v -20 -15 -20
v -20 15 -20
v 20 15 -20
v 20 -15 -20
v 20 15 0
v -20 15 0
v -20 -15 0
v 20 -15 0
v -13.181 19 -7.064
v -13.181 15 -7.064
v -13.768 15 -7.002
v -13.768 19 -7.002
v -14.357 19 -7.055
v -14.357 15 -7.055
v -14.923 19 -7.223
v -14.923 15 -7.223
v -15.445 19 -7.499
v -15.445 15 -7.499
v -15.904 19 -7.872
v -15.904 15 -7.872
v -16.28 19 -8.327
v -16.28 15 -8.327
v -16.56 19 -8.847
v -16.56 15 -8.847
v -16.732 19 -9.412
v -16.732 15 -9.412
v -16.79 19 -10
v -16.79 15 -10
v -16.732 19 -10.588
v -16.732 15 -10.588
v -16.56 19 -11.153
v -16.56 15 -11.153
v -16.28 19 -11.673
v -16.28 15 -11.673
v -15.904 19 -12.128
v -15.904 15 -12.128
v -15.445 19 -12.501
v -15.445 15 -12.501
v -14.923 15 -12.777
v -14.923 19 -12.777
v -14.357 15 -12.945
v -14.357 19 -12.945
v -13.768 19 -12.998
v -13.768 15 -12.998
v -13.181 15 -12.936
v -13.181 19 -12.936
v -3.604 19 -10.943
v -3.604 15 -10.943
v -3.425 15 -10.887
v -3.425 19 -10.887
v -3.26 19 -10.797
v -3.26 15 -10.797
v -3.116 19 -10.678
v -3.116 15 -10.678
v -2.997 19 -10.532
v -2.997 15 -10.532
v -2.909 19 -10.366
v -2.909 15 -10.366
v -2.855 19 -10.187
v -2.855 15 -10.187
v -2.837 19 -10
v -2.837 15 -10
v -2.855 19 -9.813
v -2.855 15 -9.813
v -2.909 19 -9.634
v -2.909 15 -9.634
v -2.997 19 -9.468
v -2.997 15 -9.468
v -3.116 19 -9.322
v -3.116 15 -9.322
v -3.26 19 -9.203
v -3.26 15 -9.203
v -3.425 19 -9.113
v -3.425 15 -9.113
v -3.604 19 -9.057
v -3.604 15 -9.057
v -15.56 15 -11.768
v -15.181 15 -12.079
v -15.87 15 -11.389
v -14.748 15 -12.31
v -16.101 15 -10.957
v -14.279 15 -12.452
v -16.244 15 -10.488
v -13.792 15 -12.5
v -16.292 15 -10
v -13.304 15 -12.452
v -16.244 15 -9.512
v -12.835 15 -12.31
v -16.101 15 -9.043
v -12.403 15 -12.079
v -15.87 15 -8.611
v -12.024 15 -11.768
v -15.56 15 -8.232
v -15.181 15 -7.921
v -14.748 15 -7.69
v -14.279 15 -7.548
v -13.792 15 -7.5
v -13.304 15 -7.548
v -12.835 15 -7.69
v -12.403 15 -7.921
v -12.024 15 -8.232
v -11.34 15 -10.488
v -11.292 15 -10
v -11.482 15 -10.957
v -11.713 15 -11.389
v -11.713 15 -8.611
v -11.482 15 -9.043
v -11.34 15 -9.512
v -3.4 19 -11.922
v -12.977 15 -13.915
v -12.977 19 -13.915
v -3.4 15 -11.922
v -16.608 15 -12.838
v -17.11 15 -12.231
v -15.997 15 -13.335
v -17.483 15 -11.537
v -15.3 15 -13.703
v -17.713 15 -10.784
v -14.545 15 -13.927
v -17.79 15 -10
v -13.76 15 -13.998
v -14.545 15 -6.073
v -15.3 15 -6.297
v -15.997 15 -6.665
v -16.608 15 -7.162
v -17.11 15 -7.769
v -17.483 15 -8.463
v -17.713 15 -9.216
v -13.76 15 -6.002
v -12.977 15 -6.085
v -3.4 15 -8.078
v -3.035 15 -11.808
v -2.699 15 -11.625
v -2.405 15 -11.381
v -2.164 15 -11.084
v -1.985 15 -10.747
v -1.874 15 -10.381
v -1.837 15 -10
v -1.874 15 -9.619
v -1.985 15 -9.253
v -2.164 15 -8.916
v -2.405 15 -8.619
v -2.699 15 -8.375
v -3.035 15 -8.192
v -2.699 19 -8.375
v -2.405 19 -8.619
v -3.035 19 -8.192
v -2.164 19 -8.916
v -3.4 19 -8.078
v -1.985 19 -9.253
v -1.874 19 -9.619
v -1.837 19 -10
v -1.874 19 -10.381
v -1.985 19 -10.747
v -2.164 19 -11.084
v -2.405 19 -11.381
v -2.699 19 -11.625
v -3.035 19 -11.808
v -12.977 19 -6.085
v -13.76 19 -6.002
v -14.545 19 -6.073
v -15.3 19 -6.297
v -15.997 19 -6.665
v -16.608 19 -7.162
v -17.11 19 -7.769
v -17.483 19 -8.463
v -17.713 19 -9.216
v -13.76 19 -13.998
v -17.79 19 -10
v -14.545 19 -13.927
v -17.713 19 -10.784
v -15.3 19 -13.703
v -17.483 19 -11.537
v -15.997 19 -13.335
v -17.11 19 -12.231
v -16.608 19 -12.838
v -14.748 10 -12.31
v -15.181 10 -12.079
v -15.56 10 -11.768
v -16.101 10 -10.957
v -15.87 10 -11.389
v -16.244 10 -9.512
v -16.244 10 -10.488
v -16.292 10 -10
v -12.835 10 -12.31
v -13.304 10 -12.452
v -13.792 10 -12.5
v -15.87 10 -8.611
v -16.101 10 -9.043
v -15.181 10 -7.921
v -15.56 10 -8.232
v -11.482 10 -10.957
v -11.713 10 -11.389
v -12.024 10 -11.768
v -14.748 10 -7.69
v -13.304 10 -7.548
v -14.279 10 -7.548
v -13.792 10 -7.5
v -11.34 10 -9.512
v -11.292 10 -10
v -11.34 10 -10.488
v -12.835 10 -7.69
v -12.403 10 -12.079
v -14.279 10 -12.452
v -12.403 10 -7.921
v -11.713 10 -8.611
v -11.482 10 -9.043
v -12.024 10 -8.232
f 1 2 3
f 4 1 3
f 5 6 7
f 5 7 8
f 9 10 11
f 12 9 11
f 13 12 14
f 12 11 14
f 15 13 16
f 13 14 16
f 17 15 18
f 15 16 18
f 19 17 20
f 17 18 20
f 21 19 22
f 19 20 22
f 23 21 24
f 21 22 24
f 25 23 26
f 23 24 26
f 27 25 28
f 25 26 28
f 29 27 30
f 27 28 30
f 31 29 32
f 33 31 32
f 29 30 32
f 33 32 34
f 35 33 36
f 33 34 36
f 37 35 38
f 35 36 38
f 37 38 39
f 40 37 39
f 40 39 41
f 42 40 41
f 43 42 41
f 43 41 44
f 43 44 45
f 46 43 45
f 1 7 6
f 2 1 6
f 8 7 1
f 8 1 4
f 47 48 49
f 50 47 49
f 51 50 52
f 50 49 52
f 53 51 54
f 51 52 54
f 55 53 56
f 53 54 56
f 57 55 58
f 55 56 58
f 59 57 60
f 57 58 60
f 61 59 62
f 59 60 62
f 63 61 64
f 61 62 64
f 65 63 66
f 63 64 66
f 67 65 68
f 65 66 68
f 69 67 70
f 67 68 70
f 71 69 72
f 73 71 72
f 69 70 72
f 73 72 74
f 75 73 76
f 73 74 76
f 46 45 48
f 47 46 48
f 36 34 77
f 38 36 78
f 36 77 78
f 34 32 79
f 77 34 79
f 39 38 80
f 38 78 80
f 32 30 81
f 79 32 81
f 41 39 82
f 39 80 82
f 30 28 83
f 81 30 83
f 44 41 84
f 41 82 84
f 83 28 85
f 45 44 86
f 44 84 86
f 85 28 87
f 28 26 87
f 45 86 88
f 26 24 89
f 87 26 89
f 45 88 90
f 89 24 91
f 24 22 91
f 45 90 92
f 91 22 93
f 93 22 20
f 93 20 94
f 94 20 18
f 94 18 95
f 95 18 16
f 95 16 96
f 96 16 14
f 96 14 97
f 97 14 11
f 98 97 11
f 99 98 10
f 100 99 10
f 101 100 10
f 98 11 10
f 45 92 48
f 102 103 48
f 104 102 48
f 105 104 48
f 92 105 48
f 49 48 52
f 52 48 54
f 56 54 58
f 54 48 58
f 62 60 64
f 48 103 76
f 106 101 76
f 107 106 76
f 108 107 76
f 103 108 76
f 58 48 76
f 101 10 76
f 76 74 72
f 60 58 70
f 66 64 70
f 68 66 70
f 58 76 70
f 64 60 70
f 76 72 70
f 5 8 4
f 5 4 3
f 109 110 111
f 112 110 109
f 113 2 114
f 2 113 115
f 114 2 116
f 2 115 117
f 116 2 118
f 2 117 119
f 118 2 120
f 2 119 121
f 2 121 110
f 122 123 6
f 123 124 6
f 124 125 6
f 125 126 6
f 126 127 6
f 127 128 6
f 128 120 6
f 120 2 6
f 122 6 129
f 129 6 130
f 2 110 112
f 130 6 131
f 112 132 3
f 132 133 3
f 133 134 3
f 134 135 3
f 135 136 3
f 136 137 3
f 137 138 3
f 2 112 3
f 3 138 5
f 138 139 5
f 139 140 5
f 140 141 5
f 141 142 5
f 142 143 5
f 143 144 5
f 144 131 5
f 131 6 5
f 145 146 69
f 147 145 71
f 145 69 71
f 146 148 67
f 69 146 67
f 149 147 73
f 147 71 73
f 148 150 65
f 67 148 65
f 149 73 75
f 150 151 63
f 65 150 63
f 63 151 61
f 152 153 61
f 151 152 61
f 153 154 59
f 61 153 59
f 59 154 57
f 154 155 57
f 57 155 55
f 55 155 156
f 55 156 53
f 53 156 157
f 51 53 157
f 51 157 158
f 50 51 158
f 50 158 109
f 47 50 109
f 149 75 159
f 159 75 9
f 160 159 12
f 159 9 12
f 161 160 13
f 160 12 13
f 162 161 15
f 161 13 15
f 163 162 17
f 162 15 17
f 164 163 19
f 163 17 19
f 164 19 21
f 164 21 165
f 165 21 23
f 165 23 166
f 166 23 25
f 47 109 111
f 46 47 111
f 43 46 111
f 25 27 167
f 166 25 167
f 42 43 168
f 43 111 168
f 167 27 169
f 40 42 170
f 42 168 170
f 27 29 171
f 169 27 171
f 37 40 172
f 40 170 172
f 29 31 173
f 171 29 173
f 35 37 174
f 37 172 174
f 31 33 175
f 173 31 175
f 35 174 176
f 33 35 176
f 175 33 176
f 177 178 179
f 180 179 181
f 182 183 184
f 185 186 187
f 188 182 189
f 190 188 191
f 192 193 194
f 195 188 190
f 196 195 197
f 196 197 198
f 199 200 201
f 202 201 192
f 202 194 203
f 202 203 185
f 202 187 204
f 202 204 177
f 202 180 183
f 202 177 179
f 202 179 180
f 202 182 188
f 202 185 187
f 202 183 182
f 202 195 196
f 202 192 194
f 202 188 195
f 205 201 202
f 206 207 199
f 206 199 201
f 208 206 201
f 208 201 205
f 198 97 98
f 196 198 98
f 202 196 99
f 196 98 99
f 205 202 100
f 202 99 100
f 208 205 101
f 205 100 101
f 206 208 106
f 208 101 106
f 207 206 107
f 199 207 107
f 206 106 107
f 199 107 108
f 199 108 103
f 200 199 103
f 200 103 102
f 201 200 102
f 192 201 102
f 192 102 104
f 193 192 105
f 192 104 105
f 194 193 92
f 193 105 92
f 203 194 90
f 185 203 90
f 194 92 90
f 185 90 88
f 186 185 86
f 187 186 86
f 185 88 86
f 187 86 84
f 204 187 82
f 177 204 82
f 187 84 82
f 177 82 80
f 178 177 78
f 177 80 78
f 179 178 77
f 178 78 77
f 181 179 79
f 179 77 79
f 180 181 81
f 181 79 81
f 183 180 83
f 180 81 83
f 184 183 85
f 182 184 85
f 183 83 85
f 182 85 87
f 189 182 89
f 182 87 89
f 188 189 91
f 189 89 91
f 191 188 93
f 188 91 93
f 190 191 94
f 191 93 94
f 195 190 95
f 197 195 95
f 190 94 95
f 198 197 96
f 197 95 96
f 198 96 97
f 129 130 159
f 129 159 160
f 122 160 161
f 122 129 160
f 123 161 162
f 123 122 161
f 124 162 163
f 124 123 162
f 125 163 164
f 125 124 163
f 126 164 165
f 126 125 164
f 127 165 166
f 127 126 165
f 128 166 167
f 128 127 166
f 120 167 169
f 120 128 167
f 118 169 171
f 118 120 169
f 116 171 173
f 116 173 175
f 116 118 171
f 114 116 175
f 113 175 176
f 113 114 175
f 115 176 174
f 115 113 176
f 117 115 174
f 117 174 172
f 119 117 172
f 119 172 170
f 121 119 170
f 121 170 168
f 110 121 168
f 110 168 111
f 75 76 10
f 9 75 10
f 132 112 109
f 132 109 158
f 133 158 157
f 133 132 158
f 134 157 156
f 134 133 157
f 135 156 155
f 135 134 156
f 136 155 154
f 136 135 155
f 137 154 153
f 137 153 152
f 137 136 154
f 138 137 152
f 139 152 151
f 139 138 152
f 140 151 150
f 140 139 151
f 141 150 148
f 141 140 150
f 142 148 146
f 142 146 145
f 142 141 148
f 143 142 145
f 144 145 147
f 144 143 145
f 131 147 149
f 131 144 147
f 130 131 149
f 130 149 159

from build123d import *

# Parameters (mm, degrees)
SKETCH1_W           = 40
SKETCH1_H           = 30
BOSS_EXTRUDE1_DEPTH = 20
BOSS_EXTRUDE2_DEPTH = 4
SKETCH4_R           = 2.5
CUT_EXTRUDE1_DEPTH  = 5


with BuildPart() as part:
    # Sketch1 → Boss-Extrude1 (new body)
    with BuildSketch(Plane.XY):
        Rectangle(SKETCH1_W, SKETCH1_H)
    extrude(amount=-BOSS_EXTRUDE1_DEPTH)

    # Sketch3 → Boss-Extrude2 (add)
    with BuildSketch(Plane(origin=(0, 15, 0), x_dir=(1, 0, 0), z_dir=(0, 1, 0))):
        with BuildLine():
            Line((-12.97722879, 13.914589169), (-3.400294542, 11.921916457))
            ThreePointArc((-3.400294542, 11.921916457), (-1.837109147, 10), (-3.400294542, 8.078083543))
            Line((-3.400294542, 8.078083543), (-12.97722879, 6.085410831))
            ThreePointArc((-12.97722879, 6.085410831), (-17.790166122, 10), (-12.97722879, 13.914589169))
        make_face()
        with BuildLine():
            Line((-13.18093595, 12.935557304), (-3.604001703, 10.942884592))
            ThreePointArc((-3.604001703, 10.942884592), (-2.837109147, 10), (-3.604001703, 9.057115408))
            Line((-3.604001703, 9.057115408), (-13.18093595, 7.064442696))
            ThreePointArc((-13.18093595, 7.064442696), (-16.790166122, 10), (-13.18093595, 12.935557304))
        make_face(mode=Mode.SUBTRACT)
    extrude(amount=BOSS_EXTRUDE2_DEPTH)

    # Sketch4 → Cut-Extrude1 (cut)
    with BuildSketch(Plane(origin=(0, 15, 0), x_dir=(1, 0, 0), z_dir=(0, 1, 0))):
        with Locations(Location((-13.791737359, 10, 0), (0, 0, 270))):
            Circle(SKETCH4_R)
    extrude(amount=-CUT_EXTRUDE1_DEPTH, mode=Mode.SUBTRACT)


solid = part.part
